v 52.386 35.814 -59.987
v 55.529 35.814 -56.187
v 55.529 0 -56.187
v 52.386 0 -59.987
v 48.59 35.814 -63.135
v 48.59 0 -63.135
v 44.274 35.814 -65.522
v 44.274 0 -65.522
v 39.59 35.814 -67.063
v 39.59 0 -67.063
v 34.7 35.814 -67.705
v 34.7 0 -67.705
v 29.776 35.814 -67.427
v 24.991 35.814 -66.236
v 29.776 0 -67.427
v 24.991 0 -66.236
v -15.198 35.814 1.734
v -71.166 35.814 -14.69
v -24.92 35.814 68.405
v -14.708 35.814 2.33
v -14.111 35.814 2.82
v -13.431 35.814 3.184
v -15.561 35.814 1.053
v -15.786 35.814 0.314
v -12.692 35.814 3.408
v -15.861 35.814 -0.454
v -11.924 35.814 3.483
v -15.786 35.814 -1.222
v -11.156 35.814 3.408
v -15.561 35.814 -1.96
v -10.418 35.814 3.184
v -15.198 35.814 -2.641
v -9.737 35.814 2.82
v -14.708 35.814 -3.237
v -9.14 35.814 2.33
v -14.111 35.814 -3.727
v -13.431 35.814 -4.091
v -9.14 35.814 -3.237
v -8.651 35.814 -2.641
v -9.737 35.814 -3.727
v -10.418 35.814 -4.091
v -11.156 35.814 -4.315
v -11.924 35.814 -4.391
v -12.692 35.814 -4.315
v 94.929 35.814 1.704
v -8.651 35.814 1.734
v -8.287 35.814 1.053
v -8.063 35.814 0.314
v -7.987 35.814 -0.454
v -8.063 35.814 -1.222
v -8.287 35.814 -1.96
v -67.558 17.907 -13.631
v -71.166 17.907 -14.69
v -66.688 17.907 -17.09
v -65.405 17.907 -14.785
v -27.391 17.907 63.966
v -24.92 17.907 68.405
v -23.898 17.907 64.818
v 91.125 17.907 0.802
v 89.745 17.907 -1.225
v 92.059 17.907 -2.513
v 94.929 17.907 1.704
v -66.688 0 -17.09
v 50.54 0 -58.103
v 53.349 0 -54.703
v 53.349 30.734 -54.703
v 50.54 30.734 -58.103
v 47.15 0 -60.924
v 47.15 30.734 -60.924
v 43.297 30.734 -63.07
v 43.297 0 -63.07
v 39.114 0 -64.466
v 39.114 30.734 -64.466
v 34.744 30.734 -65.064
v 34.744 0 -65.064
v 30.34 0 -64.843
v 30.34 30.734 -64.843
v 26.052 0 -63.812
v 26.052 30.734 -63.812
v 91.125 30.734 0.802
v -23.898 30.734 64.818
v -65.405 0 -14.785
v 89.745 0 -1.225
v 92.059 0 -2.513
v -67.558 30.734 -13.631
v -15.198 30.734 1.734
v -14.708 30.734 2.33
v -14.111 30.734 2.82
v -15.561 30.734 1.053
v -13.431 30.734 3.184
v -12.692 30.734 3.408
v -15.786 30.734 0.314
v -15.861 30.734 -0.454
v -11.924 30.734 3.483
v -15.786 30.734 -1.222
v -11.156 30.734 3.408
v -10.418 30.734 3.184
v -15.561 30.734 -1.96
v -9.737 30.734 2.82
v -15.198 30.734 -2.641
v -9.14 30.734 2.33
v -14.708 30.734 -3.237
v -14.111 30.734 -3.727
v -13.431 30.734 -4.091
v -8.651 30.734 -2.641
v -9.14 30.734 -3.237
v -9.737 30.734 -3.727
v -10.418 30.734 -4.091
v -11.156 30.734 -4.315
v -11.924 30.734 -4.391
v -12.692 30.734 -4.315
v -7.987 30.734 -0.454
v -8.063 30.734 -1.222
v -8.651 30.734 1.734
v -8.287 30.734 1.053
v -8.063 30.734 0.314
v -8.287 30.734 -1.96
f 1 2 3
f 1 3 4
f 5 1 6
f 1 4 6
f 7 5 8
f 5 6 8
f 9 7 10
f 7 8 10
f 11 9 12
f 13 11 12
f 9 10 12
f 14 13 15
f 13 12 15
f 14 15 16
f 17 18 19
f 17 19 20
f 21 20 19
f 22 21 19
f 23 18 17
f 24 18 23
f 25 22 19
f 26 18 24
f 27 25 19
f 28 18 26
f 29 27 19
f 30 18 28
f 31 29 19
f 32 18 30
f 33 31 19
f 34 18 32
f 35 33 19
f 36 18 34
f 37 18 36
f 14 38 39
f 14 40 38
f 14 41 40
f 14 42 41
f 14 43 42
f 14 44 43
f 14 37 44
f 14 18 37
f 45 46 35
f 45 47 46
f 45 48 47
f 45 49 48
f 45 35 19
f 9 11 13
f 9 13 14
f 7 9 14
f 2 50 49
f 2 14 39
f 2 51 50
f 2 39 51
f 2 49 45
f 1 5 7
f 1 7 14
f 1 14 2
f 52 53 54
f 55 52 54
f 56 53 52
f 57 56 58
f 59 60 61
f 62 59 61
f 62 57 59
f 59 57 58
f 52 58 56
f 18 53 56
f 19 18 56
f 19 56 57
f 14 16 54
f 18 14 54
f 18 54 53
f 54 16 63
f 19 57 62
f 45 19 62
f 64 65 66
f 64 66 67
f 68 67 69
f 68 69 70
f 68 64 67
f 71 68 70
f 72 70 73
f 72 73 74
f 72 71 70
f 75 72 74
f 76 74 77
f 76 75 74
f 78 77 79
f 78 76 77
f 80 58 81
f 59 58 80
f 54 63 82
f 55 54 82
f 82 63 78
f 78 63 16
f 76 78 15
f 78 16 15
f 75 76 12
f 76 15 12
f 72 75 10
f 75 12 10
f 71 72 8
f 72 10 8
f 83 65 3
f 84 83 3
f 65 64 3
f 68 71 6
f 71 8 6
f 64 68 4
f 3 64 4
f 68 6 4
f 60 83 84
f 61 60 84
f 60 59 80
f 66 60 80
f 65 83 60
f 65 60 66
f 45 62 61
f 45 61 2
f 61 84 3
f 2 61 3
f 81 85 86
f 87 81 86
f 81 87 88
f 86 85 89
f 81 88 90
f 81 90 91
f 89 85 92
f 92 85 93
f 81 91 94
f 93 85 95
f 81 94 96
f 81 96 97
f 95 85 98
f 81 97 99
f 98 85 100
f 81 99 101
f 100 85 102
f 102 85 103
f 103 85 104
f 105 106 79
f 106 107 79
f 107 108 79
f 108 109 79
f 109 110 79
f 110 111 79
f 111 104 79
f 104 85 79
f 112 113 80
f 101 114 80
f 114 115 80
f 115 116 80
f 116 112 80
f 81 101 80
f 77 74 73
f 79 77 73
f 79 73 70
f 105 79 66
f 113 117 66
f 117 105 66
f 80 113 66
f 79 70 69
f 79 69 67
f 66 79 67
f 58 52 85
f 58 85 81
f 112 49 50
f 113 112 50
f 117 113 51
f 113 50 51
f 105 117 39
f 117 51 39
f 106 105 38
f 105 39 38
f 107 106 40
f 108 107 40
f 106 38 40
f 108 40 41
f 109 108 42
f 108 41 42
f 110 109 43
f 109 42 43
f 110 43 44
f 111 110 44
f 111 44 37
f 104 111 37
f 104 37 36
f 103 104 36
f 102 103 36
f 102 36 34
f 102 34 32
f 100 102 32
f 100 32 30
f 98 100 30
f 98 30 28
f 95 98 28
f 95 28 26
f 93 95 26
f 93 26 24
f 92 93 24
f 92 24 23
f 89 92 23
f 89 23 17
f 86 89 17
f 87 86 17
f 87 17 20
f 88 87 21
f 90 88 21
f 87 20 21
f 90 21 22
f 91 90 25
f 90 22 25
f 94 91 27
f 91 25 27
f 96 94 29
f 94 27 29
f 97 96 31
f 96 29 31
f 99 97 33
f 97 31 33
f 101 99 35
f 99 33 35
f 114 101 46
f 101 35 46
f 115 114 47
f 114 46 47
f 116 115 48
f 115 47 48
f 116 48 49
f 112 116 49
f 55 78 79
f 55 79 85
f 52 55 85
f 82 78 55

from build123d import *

# Parameters (mm, degrees)
BOSS_EXTRUDE1_DEPTH = 35.814
CUT_EXTRUDE1_DEPTH  = 30.734
SKETCH5_R           = 3.937
CUT_EXTRUDE2_DEPTH  = 12.7
SKETCH7_W           = 137.16
SKETCH7_H           = 17.907
CUT_EXTRUDE3_DEPTH  = 5.08
SKETCH8_W           = 90.016933803
SKETCH8_H           = 17.907
CUT_EXTRUDE4_DEPTH  = 5.08


with BuildPart() as part:
    # Sketch1 → Boss-Extrude1 (new body)
    with BuildSketch(Plane(origin=(0, 0, 0), x_dir=(1, 0, 0), z_dir=(0, 1, 0))):
        with BuildLine():
            Line((94.928870908, -1.703626264), (55.529419709, 56.18731626))
            ThreePointArc((55.529419709, 56.18731626), (41.967930942, 66.402029849), (24.990687805, 66.235997574))
            Line((24.990687805, 66.235997574), (-71.166136997, 14.689688471))
            Line((-71.166136997, 14.689688471), (-24.920143323, -68.405045948))
            Line((-24.920143323, -68.405045948), (94.928870908, -1.703626264))
        make_face()
    extrude(amount=BOSS_EXTRUDE1_DEPTH)

    # Sketch1<6> → Cut-Extrude1 (cut)
    with BuildSketch(Plane(origin=(0, 0, 0), x_dir=(1, 0, 0), z_dir=(0, 1, 0))):
        with BuildLine():
            Line((26.052021788, 63.812159478), (-67.558235137, 13.630976306))
            Line((-67.558235137, 13.630976306), (-23.898074198, -64.817537603))
            Line((-23.898074198, -64.817537603), (91.124715274, -0.802131195))
            Line((91.124715274, -0.802131195), (53.348830885, 54.703249855))
            ThreePointArc((53.348830885, 54.703249855), (41.23793969, 63.8651945), (26.052021788, 63.812159478))
        make_face()
    extrude(amount=CUT_EXTRUDE1_DEPTH, mode=Mode.SUBTRACT)

    # Sketch5 → Cut-Extrude2 (cut)
    with BuildSketch(Plane(origin=(0, 35.814, 0), x_dir=(1, 0, 0), z_dir=(0, 1, 0))):
        with Locations((-11.924156141, 0.45361366)):
            Circle(SKETCH5_R)
    extrude(amount=-CUT_EXTRUDE2_DEPTH, mode=Mode.SUBTRACT)

    # Sketch7 → Cut-Extrude3 (cut)
    with BuildSketch(Plane(origin=(23.173771068, 0, 41.638598275), x_dir=(0.8737898383745012, 0, -0.48630373055680265), z_dir=(0.48630373055680265, 0, 0.8737898383745012))):
        with Locations((13.53940296, 8.9535)):
            Rectangle(SKETCH7_W, SKETCH7_H)
    extrude(amount=-CUT_EXTRUDE3_DEPTH, mode=Mode.SUBTRACT)

    # Sketch8 → Cut-Extrude4 (cut)
    with BuildSketch(Plane(origin=(-48.093914392, 0, 26.766447673), x_dir=(0.48630373055680204, 0, 0.8737898383745015), z_dir=(-0.8737898383745015, 0, 0.4863037305568021))):
        with Locations((-2.435591524, 8.9535)):
            Rectangle(SKETCH8_W, SKETCH8_H)
    extrude(amount=-CUT_EXTRUDE4_DEPTH, mode=Mode.SUBTRACT)


solid = part.part
